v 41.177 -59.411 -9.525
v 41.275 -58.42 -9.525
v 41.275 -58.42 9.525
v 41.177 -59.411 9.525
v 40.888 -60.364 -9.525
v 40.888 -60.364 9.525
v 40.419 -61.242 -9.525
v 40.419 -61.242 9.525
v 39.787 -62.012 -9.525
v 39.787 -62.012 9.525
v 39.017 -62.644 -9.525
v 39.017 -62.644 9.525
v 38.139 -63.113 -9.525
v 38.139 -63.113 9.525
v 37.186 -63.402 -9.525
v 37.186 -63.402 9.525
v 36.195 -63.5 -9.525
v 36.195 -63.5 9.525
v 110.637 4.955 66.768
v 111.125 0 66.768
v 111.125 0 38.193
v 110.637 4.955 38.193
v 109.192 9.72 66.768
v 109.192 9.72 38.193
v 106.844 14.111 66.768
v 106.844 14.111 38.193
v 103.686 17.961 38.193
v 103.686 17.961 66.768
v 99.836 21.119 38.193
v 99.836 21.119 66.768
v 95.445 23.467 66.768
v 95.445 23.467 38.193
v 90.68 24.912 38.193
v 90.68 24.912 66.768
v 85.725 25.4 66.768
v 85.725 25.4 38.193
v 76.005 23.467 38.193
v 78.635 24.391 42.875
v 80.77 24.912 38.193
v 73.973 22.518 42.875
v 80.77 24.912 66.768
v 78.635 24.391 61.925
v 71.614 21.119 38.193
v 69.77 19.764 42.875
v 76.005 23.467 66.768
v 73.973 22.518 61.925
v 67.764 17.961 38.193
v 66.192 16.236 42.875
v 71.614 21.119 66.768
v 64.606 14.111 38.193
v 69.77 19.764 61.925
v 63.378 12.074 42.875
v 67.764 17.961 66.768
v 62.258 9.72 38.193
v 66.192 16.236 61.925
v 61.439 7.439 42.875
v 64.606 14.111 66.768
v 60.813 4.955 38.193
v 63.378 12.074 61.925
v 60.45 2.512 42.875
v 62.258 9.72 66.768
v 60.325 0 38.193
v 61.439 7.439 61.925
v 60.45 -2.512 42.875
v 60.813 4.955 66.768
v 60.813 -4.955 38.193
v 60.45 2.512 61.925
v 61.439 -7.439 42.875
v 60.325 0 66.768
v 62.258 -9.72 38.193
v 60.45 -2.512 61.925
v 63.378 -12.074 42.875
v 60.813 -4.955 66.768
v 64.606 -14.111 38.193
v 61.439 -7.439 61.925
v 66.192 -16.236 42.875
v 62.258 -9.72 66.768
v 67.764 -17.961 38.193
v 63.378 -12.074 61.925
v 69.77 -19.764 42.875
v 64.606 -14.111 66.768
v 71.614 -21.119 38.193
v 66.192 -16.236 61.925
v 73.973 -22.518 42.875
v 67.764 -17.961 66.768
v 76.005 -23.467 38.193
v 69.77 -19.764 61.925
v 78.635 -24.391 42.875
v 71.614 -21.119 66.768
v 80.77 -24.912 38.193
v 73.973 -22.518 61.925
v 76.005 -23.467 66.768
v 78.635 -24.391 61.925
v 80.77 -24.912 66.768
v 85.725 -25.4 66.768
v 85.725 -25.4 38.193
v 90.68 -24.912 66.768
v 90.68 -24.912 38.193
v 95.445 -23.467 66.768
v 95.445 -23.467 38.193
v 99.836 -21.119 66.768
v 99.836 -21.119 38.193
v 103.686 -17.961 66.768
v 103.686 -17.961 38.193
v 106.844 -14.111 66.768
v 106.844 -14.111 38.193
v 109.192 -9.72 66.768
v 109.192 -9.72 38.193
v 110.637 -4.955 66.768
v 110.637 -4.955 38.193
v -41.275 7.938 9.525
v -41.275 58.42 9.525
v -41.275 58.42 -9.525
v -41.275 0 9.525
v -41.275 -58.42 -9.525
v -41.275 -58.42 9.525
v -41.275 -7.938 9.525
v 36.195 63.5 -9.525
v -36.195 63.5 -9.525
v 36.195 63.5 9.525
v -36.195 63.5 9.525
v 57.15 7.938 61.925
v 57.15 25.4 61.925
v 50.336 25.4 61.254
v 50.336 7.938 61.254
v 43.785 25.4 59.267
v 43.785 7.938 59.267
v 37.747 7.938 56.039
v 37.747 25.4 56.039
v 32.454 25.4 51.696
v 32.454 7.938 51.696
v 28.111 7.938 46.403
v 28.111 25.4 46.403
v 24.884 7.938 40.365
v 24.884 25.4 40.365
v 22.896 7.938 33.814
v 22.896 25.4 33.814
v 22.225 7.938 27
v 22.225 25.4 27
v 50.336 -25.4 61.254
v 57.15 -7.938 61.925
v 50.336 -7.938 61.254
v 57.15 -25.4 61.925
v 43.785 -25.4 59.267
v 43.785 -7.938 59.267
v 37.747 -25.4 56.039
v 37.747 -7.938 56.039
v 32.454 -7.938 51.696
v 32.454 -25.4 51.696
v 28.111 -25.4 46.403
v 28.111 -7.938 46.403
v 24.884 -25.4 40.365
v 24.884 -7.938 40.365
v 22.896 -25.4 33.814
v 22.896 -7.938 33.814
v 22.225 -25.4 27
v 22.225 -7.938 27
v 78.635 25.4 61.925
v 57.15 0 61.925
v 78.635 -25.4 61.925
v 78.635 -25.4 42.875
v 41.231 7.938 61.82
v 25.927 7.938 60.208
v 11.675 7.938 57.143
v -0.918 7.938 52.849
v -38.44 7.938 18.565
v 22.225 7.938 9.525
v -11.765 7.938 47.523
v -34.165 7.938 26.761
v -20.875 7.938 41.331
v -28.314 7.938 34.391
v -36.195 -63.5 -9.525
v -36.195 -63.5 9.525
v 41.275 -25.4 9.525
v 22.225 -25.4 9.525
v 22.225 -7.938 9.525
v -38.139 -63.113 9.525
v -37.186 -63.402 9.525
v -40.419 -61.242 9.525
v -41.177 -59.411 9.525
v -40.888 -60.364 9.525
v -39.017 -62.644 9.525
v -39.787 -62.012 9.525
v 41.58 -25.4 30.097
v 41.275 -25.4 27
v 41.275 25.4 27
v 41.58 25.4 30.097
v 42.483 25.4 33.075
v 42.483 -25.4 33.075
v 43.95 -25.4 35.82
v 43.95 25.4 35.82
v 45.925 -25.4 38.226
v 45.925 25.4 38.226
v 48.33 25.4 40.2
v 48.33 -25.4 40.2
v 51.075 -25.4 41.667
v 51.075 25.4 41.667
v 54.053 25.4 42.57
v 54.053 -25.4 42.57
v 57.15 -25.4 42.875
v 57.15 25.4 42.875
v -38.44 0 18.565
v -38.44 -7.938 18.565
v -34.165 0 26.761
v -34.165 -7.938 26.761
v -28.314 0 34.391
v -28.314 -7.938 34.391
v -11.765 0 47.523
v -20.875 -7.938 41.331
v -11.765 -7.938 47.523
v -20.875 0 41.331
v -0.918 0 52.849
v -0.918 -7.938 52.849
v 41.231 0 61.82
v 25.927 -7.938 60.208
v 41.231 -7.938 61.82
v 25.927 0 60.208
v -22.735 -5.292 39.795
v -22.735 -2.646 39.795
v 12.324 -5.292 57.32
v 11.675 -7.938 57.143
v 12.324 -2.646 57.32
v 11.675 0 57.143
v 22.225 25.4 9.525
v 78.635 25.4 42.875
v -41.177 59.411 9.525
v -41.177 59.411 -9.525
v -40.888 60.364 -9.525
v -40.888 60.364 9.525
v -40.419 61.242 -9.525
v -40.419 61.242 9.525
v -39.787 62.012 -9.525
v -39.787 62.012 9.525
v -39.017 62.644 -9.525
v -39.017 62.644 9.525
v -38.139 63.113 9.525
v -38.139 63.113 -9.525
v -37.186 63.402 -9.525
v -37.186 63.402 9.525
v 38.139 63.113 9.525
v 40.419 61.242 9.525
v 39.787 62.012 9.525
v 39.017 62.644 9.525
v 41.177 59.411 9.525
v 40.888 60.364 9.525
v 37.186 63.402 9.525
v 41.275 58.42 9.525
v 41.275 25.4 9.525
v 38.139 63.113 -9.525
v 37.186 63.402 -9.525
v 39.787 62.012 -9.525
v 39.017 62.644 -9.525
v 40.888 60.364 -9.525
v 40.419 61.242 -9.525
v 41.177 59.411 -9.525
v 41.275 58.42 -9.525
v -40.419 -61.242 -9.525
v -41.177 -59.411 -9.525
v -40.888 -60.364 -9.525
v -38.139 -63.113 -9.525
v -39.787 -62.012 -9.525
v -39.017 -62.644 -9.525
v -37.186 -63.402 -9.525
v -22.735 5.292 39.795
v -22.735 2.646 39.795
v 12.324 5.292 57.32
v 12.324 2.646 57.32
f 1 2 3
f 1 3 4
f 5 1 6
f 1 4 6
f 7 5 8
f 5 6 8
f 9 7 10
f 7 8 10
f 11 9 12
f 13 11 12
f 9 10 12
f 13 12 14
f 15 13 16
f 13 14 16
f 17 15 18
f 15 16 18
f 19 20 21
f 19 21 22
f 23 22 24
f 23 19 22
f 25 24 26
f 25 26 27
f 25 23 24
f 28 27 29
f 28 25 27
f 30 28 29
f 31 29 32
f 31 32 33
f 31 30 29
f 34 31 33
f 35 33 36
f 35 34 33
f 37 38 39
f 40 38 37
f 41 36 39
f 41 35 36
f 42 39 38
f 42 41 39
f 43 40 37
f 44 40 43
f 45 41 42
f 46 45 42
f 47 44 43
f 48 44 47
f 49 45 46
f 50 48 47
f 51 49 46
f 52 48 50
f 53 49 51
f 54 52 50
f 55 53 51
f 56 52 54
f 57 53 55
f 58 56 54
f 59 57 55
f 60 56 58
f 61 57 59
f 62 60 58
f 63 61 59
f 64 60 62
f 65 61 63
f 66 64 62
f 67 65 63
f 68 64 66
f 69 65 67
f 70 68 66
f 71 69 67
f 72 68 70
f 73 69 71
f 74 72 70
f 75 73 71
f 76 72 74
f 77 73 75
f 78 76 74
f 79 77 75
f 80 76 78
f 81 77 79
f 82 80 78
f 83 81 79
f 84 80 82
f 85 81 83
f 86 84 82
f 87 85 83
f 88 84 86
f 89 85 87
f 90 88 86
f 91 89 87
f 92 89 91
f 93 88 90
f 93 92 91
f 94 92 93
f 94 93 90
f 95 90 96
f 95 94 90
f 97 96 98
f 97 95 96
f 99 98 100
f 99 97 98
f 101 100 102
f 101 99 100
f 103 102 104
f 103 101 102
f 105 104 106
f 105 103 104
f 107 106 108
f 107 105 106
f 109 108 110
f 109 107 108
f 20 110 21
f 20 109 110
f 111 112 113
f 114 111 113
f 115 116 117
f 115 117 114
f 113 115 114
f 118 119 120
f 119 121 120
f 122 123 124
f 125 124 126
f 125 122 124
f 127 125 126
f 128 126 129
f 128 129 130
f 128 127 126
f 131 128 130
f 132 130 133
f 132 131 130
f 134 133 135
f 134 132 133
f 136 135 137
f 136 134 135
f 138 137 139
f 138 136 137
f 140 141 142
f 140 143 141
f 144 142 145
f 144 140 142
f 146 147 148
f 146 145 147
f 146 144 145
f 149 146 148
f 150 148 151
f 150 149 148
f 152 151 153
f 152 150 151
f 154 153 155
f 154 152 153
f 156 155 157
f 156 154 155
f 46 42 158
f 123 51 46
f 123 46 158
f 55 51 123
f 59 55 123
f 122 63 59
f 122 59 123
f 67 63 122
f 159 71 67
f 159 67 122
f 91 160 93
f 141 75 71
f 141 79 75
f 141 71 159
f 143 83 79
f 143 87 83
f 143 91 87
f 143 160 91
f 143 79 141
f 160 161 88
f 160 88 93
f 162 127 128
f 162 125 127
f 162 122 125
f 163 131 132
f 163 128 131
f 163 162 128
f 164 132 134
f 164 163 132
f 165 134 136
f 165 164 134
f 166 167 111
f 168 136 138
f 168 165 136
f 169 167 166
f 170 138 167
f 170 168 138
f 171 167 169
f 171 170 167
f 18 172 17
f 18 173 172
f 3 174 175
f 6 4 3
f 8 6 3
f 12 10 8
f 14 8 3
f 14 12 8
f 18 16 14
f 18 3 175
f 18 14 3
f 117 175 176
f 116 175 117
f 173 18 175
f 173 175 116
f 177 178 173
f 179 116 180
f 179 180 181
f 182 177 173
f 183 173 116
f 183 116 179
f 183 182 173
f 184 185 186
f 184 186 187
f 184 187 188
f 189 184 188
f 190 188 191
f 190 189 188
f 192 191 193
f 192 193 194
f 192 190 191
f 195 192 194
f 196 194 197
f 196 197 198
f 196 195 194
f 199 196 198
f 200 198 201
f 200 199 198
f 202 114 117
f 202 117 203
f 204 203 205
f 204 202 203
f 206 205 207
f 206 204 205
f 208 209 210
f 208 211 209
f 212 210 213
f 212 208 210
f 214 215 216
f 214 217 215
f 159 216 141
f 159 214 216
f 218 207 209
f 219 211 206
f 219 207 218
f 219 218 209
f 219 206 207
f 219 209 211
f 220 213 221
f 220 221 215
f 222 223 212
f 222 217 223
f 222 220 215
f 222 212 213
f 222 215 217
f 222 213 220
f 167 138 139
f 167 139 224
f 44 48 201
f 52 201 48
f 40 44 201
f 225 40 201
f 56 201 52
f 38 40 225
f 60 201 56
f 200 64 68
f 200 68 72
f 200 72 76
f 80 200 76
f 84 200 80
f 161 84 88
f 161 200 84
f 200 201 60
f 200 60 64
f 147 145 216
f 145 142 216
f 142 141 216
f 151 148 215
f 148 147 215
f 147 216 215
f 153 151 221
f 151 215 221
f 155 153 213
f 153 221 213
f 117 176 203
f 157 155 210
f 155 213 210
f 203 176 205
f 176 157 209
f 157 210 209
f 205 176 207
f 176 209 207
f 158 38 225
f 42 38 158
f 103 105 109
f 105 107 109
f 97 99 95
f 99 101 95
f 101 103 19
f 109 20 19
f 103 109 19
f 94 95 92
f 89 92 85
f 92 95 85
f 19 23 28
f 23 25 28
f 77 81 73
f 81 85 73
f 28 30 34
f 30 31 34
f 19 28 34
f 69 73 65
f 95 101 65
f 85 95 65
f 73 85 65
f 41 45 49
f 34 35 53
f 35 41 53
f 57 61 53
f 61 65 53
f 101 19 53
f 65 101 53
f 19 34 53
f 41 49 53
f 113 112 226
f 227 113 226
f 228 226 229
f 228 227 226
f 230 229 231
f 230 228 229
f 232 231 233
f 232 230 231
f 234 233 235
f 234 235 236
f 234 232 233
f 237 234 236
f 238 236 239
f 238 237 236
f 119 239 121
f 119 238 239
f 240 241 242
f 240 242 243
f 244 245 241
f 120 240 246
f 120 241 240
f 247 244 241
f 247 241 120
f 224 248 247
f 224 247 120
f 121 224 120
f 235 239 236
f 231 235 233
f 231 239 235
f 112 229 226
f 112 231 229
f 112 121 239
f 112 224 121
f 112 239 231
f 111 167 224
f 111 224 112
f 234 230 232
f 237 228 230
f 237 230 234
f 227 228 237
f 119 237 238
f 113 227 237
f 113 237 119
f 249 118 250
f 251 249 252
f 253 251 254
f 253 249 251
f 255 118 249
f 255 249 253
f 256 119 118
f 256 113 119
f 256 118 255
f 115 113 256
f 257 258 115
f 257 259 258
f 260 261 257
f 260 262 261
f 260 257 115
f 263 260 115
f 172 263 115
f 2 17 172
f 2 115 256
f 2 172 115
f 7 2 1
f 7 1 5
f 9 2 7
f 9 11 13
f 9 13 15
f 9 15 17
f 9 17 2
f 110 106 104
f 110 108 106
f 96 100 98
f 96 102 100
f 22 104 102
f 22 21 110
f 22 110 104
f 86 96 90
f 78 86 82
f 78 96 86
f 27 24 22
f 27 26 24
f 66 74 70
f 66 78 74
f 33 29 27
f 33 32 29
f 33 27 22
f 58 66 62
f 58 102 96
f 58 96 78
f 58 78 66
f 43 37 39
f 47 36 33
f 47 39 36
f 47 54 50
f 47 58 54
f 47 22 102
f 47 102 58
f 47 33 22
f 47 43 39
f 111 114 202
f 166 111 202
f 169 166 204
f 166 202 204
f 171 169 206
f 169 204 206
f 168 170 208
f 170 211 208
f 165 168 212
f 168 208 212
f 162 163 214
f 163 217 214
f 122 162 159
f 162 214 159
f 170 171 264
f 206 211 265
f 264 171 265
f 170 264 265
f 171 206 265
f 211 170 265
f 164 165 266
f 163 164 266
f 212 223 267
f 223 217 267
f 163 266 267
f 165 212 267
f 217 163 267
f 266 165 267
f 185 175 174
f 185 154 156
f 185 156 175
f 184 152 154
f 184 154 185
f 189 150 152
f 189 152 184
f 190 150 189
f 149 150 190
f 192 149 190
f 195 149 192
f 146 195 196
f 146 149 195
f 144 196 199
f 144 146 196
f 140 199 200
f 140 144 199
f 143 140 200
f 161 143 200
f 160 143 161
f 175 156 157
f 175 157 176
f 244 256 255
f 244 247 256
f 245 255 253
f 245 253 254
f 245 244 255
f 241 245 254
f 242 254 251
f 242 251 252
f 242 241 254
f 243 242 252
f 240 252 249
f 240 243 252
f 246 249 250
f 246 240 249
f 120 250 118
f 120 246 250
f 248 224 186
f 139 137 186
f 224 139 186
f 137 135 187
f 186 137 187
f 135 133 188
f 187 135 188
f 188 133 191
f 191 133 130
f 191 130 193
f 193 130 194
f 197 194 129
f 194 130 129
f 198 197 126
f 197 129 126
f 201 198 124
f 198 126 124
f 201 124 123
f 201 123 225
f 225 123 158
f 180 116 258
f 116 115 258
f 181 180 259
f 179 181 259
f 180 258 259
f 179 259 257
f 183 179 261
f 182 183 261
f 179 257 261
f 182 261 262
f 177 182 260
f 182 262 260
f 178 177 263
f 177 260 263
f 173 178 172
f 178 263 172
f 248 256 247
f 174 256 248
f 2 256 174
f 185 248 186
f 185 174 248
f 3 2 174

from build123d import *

# Parameters (mm, degrees)
F1_DEPTH = 63.5
F0_W     = 18.3103905071
F0_H     = 19.05
F2_DEPTH = 25.4
F3_DEPTH = 7.9375
F0_W_2   = 25.4
F0_H_2   = 28.575
F5_R     = 5.08


# Not quite as in the source:
# - a feature names something its author has since deleted; it is built from what else it names


with BuildPart() as f1:
    # F0 (on Front) → F1 (new body, symmetric)
    with BuildSketch(Plane.XZ):
        Polygon((-41.275, -9.525), (41.275, -9.525), (41.275, 9.525), (22.225, 9.525), (-41.275, 9.525), align=None)
    extrude(amount=F1_DEPTH, both=True)

    # F0 (on Front) → F2 (join, symmetric)
    with BuildSketch(Plane.XZ):
        with BuildLine():
            Line((22.225, 9.525), (41.275, 9.525))
            Line((41.275, 9.525), (41.275, 27.0002))
            ThreePointArc((41.275, 27.0002), (45.9246798487, 38.2255201513), (57.15, 42.8752))
            Line((57.15, 42.8752), (60.325, 42.8752))
            Line((60.325, 42.8752), (60.325, 61.9252))
            Line((60.325, 61.9252), (57.15, 61.9252))
            ThreePointArc((57.15, 61.9252), (32.4542956671, 51.6959043329), (22.225, 27.0002))
            Line((22.225, 27.0002), (22.225, 9.525))
        make_face()
        with Locations((69.4801952536, 52.4002)):
            Rectangle(F0_W, F0_H)
    extrude(amount=F2_DEPTH, both=True)

    # F0 (on Front) → F3 (join, symmetric)
    with BuildSketch(Plane.XZ):
        with BuildLine():
            add(Edge.make_bspline(
                [(-41.275, 9.525), (-33.2450978458, 46.1078099906), (9.6913008019, 63.8398453593), (57.15, 61.9252)],
                knots=[0, 0, 0, 0, 111.5045361635, 111.5045361635, 111.5045361635, 111.5045361635], degree=3))
            Line((-41.275, 9.525), (22.225, 9.525))
            Line((22.225, 9.525), (22.225, 27.0002))
            ThreePointArc((22.225, 27.0002), (32.4542956671, 51.6959043329), (57.15, 61.9252))
        make_face()
    extrude(amount=F3_DEPTH, both=True)

    # F0 (on Front) → F4 (revolve)
    with BuildSketch(Plane.XZ):
        with Locations((98.425, 52.4808056653)):
            Rectangle(F0_W_2, F0_H_2)
    revolve(axis=Axis((85.725, 0, 52.4808056653), (0, 0, 1)))

    # F5
    f5_edges = [f1.edges().sort_by_distance(p)[0] for p in [
        (41.275, -63.5, 0),
        (41.275, 63.5, 0),
        (-41.275, 63.5, 0),
        (-41.275, -63.5, 0),
    ]]
    fillet(f5_edges, radius=F5_R)


solid = f1.part
